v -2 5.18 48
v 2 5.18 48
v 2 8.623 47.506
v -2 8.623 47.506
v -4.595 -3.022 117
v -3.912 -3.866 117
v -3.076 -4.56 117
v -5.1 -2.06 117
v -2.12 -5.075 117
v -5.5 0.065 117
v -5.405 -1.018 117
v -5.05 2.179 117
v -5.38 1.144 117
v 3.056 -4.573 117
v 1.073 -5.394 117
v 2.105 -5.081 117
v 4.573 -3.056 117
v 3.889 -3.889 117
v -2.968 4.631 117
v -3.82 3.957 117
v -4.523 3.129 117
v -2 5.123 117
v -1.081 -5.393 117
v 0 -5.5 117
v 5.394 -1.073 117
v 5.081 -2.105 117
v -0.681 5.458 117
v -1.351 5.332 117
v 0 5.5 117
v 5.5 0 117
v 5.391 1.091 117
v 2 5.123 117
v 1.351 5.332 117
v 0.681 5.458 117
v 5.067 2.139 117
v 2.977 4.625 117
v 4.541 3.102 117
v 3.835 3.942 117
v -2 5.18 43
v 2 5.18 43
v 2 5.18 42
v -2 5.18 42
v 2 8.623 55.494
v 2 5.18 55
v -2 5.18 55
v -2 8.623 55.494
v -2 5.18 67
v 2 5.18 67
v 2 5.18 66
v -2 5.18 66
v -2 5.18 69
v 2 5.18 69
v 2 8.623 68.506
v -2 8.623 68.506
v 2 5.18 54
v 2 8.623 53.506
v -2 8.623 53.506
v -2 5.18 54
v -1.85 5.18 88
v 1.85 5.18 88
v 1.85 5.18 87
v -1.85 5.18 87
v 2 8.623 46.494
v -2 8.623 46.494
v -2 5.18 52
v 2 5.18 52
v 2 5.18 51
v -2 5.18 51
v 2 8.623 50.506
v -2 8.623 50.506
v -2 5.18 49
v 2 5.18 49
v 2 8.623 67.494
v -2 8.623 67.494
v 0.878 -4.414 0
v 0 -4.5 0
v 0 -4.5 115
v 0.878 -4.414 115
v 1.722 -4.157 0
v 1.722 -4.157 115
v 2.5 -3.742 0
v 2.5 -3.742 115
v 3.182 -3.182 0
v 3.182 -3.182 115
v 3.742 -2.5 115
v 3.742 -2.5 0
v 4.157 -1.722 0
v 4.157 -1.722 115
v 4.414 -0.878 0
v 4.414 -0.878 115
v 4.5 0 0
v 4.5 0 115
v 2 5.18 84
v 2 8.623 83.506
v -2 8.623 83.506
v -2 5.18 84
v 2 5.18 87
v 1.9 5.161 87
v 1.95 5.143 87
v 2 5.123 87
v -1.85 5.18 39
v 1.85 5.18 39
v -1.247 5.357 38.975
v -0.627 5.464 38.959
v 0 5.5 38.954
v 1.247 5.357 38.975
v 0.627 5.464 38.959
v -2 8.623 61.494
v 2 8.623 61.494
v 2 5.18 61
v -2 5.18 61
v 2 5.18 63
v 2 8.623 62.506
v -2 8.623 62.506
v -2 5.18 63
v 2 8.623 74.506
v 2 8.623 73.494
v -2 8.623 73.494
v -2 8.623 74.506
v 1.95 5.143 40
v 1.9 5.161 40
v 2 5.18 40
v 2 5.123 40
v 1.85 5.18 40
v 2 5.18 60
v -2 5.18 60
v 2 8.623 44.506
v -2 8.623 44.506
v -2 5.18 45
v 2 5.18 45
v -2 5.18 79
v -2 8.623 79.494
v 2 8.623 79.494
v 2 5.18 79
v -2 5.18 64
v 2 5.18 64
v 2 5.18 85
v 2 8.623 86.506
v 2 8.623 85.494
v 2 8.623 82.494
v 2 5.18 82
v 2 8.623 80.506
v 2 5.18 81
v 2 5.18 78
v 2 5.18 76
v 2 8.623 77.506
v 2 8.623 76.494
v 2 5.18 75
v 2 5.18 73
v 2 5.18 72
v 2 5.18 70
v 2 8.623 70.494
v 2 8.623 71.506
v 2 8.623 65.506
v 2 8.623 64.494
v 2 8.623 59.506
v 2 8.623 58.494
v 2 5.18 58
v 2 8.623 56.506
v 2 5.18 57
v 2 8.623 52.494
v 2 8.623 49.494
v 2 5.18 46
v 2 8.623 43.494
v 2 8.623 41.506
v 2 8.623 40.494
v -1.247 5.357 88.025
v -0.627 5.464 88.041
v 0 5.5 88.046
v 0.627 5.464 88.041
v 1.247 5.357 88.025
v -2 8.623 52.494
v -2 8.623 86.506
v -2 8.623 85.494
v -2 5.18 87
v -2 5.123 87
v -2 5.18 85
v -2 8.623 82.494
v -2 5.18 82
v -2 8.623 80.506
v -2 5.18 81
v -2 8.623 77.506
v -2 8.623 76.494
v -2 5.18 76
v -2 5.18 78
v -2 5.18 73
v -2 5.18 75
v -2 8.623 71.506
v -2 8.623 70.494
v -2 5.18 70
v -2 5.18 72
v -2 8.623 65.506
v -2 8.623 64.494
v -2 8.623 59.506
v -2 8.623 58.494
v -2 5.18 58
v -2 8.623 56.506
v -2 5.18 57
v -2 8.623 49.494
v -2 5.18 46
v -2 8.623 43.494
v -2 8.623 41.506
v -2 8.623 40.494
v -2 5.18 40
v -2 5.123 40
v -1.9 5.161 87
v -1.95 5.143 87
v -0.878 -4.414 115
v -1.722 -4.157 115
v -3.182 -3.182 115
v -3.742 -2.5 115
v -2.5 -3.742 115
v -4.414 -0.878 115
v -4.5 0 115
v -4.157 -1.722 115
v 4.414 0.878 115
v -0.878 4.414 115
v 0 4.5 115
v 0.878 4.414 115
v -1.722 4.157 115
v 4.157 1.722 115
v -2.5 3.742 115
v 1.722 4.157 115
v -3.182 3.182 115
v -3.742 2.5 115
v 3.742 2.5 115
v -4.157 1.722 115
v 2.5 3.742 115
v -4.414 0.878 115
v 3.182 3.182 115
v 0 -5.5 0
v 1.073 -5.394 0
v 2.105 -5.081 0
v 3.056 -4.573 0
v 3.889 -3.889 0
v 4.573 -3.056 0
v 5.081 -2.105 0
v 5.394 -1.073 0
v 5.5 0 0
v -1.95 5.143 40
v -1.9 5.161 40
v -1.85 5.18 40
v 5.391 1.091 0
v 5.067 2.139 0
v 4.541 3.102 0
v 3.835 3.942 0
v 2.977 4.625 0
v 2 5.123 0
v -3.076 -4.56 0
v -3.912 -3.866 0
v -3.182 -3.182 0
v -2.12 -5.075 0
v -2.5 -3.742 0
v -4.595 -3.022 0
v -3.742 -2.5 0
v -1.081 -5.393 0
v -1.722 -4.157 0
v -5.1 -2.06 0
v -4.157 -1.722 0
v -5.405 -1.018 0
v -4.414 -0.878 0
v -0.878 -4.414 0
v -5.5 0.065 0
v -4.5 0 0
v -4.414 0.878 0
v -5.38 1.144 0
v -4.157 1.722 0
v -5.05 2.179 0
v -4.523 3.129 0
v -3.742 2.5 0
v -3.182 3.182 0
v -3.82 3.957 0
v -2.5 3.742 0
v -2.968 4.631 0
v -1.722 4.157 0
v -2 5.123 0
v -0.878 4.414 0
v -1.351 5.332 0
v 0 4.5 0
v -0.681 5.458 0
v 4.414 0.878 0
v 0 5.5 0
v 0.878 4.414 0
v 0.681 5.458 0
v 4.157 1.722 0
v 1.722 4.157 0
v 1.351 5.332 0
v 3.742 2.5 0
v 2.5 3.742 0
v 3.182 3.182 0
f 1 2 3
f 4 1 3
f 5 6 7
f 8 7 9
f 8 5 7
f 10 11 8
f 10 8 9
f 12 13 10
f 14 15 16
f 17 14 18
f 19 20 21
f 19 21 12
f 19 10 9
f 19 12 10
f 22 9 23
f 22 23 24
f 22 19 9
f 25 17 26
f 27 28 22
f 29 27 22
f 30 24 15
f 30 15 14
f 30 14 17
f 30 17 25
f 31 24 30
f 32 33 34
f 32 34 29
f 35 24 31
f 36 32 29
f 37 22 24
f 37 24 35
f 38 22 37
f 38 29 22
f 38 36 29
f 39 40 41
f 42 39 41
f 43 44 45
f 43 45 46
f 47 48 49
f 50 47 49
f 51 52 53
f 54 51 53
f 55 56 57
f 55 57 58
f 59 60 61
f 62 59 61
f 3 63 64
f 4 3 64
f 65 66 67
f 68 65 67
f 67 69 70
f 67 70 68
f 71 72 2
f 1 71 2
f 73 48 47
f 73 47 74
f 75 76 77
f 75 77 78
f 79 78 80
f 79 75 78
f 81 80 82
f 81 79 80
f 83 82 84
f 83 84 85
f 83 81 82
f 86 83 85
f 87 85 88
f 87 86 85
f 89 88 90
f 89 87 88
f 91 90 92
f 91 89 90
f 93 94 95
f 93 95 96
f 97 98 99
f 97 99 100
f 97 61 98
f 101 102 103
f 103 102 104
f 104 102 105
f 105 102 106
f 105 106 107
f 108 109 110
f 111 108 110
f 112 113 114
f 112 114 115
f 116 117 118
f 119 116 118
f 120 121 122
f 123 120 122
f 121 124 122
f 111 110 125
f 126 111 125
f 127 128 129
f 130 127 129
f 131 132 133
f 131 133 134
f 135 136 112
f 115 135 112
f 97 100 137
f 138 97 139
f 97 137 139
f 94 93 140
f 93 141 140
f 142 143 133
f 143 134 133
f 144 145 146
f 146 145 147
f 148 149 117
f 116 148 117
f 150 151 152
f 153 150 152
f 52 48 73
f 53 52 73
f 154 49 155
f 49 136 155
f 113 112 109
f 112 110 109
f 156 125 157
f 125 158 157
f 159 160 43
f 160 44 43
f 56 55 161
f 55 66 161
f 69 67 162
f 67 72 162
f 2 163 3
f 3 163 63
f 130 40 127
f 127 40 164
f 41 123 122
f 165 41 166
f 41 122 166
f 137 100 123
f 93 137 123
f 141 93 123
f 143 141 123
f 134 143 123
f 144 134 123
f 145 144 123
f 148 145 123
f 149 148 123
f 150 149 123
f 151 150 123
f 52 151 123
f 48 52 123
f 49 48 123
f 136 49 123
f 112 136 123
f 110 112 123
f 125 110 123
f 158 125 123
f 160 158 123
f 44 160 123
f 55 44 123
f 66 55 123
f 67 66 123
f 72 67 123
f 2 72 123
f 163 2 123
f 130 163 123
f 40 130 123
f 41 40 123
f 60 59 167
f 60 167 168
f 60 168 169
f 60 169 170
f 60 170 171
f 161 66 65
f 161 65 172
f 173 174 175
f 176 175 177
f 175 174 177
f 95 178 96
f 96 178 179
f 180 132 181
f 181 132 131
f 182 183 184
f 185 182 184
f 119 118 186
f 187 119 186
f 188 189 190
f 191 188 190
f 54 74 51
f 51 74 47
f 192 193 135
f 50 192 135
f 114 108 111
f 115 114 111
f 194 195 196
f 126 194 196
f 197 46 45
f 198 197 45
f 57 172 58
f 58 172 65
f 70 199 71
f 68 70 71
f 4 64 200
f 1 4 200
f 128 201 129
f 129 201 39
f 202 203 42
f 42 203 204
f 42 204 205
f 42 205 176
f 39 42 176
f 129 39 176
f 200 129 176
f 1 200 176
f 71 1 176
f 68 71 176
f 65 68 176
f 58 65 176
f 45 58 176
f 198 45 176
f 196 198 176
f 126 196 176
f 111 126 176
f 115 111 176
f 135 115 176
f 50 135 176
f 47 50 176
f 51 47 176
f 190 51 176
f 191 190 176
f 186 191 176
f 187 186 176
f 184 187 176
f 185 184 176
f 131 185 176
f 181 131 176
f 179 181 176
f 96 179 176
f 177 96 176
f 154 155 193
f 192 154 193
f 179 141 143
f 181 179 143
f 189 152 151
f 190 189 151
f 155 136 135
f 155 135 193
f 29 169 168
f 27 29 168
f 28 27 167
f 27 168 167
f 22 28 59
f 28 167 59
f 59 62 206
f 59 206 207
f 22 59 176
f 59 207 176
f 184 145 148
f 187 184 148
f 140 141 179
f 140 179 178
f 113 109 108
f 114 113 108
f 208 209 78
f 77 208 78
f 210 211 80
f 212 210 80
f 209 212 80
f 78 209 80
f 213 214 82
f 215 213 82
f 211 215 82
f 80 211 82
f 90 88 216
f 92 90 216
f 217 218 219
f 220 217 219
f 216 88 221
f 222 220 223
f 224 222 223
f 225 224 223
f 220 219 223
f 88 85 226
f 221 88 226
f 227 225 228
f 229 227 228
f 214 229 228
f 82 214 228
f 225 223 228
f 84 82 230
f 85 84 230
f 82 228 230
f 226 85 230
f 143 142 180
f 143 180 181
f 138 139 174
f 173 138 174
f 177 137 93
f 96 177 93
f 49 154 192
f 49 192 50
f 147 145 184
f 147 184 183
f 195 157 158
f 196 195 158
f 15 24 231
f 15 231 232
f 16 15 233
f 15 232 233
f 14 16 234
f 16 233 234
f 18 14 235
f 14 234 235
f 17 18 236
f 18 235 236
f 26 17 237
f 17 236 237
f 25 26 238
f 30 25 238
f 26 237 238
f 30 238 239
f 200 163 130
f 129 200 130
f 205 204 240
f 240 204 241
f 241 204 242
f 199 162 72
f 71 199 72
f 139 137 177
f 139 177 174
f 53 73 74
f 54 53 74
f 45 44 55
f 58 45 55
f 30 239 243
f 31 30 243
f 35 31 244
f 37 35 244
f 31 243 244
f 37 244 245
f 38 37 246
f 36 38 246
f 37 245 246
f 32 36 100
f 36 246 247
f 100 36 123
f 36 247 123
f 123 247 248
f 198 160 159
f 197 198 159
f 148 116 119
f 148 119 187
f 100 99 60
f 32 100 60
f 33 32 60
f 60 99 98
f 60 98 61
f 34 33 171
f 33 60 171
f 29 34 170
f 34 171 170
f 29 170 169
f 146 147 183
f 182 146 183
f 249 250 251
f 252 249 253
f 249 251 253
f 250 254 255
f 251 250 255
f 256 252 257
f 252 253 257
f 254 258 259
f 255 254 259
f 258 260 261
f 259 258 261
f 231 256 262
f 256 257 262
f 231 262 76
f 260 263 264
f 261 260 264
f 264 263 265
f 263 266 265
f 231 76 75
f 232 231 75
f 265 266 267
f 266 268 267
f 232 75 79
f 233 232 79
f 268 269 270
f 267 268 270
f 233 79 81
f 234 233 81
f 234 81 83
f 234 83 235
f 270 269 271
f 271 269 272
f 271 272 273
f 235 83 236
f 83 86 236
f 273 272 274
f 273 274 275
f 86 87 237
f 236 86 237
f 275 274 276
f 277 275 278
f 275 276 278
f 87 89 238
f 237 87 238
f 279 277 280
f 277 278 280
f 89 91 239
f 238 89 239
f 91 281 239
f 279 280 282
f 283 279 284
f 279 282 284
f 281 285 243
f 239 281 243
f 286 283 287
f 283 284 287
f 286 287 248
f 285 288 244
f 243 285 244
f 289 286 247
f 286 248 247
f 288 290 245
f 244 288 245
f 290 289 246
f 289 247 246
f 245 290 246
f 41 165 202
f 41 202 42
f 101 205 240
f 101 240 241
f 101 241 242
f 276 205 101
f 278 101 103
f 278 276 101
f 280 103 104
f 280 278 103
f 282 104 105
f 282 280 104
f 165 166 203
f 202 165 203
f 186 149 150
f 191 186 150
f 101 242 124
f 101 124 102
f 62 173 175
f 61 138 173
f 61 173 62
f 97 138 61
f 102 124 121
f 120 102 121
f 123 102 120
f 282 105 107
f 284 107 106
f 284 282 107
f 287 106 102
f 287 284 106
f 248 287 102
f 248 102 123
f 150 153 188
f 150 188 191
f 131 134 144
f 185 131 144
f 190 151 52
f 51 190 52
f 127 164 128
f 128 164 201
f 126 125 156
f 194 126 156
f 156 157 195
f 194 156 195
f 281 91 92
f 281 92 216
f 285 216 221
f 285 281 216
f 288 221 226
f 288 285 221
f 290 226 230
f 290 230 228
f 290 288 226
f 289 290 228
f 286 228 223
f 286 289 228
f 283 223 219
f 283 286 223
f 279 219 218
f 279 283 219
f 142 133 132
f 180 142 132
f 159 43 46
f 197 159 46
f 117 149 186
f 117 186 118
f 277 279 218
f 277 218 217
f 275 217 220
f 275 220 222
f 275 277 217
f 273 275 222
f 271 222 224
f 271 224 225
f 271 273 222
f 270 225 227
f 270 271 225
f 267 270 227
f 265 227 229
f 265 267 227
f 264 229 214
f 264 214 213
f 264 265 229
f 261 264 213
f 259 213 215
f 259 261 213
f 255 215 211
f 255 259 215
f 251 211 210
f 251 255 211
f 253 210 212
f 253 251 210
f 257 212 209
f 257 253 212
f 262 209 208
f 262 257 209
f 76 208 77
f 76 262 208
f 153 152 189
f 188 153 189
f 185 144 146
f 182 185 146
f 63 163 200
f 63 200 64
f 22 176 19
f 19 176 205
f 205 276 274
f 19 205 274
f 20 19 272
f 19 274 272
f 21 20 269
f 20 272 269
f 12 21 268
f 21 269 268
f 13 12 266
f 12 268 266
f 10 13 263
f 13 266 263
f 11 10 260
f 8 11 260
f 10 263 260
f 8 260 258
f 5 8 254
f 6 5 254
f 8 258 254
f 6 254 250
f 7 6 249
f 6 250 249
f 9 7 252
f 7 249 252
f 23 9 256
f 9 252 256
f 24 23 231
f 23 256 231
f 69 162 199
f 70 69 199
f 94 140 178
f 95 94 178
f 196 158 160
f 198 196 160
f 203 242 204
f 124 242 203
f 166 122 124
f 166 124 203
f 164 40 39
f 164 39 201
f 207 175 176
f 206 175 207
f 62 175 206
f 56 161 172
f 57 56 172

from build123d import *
from build123d.topology import SkipClean

# Parameters (mm, degrees)
SKETCH1_R           = 5.5
BOSS_EXTRUDE3_DEPTH = 117
SKETCH1_3_R         = 4.5
CUT_EXTRUDE4_DEPTH  = 115
BOSS_EXTRUDE4_DEPTH = 87
CUT_EXTRUDE5_DEPTH  = 40
CUT_EXTRUDE6_DEPTH  = 4


with BuildPart() as part:
    # Sketch1 → Boss-Extrude3 (new body)
    with BuildSketch(Plane.XY):
        Circle(SKETCH1_R)
    extrude(amount=BOSS_EXTRUDE3_DEPTH)

    # Sketch1<3> → Cut-Extrude4 (cut)
    with BuildSketch(Plane.XY):
        Circle(SKETCH1_3_R)
    extrude(amount=CUT_EXTRUDE4_DEPTH, mode=Mode.SUBTRACT)

    # Sketch1<4> → Boss-Extrude4 (add)
    with BuildSketch(Plane.XY):
        with BuildLine():
            Line((2, 8.623475383), (-2, 8.623475383))
            Line((-2, 8.623475383), (-2, 5.123475383))
            ThreePointArc((-2, 5.123475383), (0, 5.5), (2, 5.123475383))
            Line((2, 5.123475383), (2, 8.623475383))
        make_face()
    extrude(amount=BOSS_EXTRUDE4_DEPTH)

    # Sketch1<5> → Cut-Extrude5 (cut)
    with SkipClean():  # the faces are left unmerged after this step: merging them gives an invalid solid
        with BuildSketch(Plane.XY):
            with BuildLine():
                Line((2, 8.623475383), (-2, 8.623475383))
                Line((-2, 8.623475383), (-2, 5.123475383))
                ThreePointArc((-2, 5.123475383), (0, 5.5), (2, 5.123475383))
                Line((2, 5.123475383), (2, 8.623475383))
            make_face()
        extrude(amount=CUT_EXTRUDE5_DEPTH, mode=Mode.SUBTRACT)

    # Sketch11 → Cut-Extrude6 (cut)
    with SkipClean():  # the faces are left unmerged after this step: merging them gives an invalid solid
        with BuildSketch(Plane(origin=(2, 0, 0), x_dir=(0, 0, -1), z_dir=(1, 0, 0))):
            Polygon((-62.5, 8.664491245), (-64.5, 8.664491245), (-64, 5.179641377), (-63, 5.179641377), align=None)
            Polygon((-59.5, 8.664491245), (-61.5, 8.664491245), (-61, 5.179641377), (-60, 5.179641377), align=None)
            Polygon((-56.5, 8.664491245), (-58.5, 8.664491245), (-58, 5.179641377), (-57, 5.179641377), align=None)
            Polygon((-53.5, 8.664491245), (-55.5, 8.664491245), (-55, 5.179641377), (-54, 5.179641377), align=None)
            Polygon((-50.5, 8.664491245), (-52.5, 8.664491245), (-52, 5.179641377), (-51, 5.179641377), align=None)
            Polygon((-47.5, 8.664491245), (-49.5, 8.664491245), (-49, 5.179641377), (-48, 5.179641377), align=None)
            Polygon((-44.5, 8.664491245), (-46.5, 8.664491245), (-46, 5.179641377), (-45, 5.179641377), align=None)
            Polygon((-41.5, 8.664491245), (-43.5, 8.664491245), (-43, 5.179641377), (-42, 5.179641377), align=None)
            Polygon((-38.5, 8.664491245), (-40.5, 8.664491245), (-40, 5.179641377), (-39, 5.179641377), align=None)
            Polygon((-65.5, 8.664491245), (-67.5, 8.664491245), (-67, 5.179641377), (-66, 5.179641377), align=None)
            Polygon((-68.5, 8.664491245), (-70.5, 8.664491245), (-70, 5.179641377), (-69, 5.179641377), align=None)
            Polygon((-71.5, 8.664491245), (-73.5, 8.664491245), (-73, 5.179641377), (-72, 5.179641377), align=None)
            Polygon((-74.5, 8.664491245), (-76.5, 8.664491245), (-76, 5.179641377), (-75, 5.179641377), align=None)
            Polygon((-77.5, 8.664491245), (-79.5, 8.664491245), (-79, 5.179641377), (-78, 5.179641377), align=None)
            Polygon((-80.5, 8.664491245), (-82.5, 8.664491245), (-82, 5.179641377), (-81, 5.179641377), align=None)
            Polygon((-83.5, 8.664491245), (-85.5, 8.664491245), (-85, 5.179641377), (-84, 5.179641377), align=None)
            Polygon((-86.5, 8.664491245), (-88.5, 8.664491245), (-88, 5.179641377), (-87, 5.179641377), align=None)
        extrude(amount=-CUT_EXTRUDE6_DEPTH, mode=Mode.SUBTRACT)


solid = part.part
